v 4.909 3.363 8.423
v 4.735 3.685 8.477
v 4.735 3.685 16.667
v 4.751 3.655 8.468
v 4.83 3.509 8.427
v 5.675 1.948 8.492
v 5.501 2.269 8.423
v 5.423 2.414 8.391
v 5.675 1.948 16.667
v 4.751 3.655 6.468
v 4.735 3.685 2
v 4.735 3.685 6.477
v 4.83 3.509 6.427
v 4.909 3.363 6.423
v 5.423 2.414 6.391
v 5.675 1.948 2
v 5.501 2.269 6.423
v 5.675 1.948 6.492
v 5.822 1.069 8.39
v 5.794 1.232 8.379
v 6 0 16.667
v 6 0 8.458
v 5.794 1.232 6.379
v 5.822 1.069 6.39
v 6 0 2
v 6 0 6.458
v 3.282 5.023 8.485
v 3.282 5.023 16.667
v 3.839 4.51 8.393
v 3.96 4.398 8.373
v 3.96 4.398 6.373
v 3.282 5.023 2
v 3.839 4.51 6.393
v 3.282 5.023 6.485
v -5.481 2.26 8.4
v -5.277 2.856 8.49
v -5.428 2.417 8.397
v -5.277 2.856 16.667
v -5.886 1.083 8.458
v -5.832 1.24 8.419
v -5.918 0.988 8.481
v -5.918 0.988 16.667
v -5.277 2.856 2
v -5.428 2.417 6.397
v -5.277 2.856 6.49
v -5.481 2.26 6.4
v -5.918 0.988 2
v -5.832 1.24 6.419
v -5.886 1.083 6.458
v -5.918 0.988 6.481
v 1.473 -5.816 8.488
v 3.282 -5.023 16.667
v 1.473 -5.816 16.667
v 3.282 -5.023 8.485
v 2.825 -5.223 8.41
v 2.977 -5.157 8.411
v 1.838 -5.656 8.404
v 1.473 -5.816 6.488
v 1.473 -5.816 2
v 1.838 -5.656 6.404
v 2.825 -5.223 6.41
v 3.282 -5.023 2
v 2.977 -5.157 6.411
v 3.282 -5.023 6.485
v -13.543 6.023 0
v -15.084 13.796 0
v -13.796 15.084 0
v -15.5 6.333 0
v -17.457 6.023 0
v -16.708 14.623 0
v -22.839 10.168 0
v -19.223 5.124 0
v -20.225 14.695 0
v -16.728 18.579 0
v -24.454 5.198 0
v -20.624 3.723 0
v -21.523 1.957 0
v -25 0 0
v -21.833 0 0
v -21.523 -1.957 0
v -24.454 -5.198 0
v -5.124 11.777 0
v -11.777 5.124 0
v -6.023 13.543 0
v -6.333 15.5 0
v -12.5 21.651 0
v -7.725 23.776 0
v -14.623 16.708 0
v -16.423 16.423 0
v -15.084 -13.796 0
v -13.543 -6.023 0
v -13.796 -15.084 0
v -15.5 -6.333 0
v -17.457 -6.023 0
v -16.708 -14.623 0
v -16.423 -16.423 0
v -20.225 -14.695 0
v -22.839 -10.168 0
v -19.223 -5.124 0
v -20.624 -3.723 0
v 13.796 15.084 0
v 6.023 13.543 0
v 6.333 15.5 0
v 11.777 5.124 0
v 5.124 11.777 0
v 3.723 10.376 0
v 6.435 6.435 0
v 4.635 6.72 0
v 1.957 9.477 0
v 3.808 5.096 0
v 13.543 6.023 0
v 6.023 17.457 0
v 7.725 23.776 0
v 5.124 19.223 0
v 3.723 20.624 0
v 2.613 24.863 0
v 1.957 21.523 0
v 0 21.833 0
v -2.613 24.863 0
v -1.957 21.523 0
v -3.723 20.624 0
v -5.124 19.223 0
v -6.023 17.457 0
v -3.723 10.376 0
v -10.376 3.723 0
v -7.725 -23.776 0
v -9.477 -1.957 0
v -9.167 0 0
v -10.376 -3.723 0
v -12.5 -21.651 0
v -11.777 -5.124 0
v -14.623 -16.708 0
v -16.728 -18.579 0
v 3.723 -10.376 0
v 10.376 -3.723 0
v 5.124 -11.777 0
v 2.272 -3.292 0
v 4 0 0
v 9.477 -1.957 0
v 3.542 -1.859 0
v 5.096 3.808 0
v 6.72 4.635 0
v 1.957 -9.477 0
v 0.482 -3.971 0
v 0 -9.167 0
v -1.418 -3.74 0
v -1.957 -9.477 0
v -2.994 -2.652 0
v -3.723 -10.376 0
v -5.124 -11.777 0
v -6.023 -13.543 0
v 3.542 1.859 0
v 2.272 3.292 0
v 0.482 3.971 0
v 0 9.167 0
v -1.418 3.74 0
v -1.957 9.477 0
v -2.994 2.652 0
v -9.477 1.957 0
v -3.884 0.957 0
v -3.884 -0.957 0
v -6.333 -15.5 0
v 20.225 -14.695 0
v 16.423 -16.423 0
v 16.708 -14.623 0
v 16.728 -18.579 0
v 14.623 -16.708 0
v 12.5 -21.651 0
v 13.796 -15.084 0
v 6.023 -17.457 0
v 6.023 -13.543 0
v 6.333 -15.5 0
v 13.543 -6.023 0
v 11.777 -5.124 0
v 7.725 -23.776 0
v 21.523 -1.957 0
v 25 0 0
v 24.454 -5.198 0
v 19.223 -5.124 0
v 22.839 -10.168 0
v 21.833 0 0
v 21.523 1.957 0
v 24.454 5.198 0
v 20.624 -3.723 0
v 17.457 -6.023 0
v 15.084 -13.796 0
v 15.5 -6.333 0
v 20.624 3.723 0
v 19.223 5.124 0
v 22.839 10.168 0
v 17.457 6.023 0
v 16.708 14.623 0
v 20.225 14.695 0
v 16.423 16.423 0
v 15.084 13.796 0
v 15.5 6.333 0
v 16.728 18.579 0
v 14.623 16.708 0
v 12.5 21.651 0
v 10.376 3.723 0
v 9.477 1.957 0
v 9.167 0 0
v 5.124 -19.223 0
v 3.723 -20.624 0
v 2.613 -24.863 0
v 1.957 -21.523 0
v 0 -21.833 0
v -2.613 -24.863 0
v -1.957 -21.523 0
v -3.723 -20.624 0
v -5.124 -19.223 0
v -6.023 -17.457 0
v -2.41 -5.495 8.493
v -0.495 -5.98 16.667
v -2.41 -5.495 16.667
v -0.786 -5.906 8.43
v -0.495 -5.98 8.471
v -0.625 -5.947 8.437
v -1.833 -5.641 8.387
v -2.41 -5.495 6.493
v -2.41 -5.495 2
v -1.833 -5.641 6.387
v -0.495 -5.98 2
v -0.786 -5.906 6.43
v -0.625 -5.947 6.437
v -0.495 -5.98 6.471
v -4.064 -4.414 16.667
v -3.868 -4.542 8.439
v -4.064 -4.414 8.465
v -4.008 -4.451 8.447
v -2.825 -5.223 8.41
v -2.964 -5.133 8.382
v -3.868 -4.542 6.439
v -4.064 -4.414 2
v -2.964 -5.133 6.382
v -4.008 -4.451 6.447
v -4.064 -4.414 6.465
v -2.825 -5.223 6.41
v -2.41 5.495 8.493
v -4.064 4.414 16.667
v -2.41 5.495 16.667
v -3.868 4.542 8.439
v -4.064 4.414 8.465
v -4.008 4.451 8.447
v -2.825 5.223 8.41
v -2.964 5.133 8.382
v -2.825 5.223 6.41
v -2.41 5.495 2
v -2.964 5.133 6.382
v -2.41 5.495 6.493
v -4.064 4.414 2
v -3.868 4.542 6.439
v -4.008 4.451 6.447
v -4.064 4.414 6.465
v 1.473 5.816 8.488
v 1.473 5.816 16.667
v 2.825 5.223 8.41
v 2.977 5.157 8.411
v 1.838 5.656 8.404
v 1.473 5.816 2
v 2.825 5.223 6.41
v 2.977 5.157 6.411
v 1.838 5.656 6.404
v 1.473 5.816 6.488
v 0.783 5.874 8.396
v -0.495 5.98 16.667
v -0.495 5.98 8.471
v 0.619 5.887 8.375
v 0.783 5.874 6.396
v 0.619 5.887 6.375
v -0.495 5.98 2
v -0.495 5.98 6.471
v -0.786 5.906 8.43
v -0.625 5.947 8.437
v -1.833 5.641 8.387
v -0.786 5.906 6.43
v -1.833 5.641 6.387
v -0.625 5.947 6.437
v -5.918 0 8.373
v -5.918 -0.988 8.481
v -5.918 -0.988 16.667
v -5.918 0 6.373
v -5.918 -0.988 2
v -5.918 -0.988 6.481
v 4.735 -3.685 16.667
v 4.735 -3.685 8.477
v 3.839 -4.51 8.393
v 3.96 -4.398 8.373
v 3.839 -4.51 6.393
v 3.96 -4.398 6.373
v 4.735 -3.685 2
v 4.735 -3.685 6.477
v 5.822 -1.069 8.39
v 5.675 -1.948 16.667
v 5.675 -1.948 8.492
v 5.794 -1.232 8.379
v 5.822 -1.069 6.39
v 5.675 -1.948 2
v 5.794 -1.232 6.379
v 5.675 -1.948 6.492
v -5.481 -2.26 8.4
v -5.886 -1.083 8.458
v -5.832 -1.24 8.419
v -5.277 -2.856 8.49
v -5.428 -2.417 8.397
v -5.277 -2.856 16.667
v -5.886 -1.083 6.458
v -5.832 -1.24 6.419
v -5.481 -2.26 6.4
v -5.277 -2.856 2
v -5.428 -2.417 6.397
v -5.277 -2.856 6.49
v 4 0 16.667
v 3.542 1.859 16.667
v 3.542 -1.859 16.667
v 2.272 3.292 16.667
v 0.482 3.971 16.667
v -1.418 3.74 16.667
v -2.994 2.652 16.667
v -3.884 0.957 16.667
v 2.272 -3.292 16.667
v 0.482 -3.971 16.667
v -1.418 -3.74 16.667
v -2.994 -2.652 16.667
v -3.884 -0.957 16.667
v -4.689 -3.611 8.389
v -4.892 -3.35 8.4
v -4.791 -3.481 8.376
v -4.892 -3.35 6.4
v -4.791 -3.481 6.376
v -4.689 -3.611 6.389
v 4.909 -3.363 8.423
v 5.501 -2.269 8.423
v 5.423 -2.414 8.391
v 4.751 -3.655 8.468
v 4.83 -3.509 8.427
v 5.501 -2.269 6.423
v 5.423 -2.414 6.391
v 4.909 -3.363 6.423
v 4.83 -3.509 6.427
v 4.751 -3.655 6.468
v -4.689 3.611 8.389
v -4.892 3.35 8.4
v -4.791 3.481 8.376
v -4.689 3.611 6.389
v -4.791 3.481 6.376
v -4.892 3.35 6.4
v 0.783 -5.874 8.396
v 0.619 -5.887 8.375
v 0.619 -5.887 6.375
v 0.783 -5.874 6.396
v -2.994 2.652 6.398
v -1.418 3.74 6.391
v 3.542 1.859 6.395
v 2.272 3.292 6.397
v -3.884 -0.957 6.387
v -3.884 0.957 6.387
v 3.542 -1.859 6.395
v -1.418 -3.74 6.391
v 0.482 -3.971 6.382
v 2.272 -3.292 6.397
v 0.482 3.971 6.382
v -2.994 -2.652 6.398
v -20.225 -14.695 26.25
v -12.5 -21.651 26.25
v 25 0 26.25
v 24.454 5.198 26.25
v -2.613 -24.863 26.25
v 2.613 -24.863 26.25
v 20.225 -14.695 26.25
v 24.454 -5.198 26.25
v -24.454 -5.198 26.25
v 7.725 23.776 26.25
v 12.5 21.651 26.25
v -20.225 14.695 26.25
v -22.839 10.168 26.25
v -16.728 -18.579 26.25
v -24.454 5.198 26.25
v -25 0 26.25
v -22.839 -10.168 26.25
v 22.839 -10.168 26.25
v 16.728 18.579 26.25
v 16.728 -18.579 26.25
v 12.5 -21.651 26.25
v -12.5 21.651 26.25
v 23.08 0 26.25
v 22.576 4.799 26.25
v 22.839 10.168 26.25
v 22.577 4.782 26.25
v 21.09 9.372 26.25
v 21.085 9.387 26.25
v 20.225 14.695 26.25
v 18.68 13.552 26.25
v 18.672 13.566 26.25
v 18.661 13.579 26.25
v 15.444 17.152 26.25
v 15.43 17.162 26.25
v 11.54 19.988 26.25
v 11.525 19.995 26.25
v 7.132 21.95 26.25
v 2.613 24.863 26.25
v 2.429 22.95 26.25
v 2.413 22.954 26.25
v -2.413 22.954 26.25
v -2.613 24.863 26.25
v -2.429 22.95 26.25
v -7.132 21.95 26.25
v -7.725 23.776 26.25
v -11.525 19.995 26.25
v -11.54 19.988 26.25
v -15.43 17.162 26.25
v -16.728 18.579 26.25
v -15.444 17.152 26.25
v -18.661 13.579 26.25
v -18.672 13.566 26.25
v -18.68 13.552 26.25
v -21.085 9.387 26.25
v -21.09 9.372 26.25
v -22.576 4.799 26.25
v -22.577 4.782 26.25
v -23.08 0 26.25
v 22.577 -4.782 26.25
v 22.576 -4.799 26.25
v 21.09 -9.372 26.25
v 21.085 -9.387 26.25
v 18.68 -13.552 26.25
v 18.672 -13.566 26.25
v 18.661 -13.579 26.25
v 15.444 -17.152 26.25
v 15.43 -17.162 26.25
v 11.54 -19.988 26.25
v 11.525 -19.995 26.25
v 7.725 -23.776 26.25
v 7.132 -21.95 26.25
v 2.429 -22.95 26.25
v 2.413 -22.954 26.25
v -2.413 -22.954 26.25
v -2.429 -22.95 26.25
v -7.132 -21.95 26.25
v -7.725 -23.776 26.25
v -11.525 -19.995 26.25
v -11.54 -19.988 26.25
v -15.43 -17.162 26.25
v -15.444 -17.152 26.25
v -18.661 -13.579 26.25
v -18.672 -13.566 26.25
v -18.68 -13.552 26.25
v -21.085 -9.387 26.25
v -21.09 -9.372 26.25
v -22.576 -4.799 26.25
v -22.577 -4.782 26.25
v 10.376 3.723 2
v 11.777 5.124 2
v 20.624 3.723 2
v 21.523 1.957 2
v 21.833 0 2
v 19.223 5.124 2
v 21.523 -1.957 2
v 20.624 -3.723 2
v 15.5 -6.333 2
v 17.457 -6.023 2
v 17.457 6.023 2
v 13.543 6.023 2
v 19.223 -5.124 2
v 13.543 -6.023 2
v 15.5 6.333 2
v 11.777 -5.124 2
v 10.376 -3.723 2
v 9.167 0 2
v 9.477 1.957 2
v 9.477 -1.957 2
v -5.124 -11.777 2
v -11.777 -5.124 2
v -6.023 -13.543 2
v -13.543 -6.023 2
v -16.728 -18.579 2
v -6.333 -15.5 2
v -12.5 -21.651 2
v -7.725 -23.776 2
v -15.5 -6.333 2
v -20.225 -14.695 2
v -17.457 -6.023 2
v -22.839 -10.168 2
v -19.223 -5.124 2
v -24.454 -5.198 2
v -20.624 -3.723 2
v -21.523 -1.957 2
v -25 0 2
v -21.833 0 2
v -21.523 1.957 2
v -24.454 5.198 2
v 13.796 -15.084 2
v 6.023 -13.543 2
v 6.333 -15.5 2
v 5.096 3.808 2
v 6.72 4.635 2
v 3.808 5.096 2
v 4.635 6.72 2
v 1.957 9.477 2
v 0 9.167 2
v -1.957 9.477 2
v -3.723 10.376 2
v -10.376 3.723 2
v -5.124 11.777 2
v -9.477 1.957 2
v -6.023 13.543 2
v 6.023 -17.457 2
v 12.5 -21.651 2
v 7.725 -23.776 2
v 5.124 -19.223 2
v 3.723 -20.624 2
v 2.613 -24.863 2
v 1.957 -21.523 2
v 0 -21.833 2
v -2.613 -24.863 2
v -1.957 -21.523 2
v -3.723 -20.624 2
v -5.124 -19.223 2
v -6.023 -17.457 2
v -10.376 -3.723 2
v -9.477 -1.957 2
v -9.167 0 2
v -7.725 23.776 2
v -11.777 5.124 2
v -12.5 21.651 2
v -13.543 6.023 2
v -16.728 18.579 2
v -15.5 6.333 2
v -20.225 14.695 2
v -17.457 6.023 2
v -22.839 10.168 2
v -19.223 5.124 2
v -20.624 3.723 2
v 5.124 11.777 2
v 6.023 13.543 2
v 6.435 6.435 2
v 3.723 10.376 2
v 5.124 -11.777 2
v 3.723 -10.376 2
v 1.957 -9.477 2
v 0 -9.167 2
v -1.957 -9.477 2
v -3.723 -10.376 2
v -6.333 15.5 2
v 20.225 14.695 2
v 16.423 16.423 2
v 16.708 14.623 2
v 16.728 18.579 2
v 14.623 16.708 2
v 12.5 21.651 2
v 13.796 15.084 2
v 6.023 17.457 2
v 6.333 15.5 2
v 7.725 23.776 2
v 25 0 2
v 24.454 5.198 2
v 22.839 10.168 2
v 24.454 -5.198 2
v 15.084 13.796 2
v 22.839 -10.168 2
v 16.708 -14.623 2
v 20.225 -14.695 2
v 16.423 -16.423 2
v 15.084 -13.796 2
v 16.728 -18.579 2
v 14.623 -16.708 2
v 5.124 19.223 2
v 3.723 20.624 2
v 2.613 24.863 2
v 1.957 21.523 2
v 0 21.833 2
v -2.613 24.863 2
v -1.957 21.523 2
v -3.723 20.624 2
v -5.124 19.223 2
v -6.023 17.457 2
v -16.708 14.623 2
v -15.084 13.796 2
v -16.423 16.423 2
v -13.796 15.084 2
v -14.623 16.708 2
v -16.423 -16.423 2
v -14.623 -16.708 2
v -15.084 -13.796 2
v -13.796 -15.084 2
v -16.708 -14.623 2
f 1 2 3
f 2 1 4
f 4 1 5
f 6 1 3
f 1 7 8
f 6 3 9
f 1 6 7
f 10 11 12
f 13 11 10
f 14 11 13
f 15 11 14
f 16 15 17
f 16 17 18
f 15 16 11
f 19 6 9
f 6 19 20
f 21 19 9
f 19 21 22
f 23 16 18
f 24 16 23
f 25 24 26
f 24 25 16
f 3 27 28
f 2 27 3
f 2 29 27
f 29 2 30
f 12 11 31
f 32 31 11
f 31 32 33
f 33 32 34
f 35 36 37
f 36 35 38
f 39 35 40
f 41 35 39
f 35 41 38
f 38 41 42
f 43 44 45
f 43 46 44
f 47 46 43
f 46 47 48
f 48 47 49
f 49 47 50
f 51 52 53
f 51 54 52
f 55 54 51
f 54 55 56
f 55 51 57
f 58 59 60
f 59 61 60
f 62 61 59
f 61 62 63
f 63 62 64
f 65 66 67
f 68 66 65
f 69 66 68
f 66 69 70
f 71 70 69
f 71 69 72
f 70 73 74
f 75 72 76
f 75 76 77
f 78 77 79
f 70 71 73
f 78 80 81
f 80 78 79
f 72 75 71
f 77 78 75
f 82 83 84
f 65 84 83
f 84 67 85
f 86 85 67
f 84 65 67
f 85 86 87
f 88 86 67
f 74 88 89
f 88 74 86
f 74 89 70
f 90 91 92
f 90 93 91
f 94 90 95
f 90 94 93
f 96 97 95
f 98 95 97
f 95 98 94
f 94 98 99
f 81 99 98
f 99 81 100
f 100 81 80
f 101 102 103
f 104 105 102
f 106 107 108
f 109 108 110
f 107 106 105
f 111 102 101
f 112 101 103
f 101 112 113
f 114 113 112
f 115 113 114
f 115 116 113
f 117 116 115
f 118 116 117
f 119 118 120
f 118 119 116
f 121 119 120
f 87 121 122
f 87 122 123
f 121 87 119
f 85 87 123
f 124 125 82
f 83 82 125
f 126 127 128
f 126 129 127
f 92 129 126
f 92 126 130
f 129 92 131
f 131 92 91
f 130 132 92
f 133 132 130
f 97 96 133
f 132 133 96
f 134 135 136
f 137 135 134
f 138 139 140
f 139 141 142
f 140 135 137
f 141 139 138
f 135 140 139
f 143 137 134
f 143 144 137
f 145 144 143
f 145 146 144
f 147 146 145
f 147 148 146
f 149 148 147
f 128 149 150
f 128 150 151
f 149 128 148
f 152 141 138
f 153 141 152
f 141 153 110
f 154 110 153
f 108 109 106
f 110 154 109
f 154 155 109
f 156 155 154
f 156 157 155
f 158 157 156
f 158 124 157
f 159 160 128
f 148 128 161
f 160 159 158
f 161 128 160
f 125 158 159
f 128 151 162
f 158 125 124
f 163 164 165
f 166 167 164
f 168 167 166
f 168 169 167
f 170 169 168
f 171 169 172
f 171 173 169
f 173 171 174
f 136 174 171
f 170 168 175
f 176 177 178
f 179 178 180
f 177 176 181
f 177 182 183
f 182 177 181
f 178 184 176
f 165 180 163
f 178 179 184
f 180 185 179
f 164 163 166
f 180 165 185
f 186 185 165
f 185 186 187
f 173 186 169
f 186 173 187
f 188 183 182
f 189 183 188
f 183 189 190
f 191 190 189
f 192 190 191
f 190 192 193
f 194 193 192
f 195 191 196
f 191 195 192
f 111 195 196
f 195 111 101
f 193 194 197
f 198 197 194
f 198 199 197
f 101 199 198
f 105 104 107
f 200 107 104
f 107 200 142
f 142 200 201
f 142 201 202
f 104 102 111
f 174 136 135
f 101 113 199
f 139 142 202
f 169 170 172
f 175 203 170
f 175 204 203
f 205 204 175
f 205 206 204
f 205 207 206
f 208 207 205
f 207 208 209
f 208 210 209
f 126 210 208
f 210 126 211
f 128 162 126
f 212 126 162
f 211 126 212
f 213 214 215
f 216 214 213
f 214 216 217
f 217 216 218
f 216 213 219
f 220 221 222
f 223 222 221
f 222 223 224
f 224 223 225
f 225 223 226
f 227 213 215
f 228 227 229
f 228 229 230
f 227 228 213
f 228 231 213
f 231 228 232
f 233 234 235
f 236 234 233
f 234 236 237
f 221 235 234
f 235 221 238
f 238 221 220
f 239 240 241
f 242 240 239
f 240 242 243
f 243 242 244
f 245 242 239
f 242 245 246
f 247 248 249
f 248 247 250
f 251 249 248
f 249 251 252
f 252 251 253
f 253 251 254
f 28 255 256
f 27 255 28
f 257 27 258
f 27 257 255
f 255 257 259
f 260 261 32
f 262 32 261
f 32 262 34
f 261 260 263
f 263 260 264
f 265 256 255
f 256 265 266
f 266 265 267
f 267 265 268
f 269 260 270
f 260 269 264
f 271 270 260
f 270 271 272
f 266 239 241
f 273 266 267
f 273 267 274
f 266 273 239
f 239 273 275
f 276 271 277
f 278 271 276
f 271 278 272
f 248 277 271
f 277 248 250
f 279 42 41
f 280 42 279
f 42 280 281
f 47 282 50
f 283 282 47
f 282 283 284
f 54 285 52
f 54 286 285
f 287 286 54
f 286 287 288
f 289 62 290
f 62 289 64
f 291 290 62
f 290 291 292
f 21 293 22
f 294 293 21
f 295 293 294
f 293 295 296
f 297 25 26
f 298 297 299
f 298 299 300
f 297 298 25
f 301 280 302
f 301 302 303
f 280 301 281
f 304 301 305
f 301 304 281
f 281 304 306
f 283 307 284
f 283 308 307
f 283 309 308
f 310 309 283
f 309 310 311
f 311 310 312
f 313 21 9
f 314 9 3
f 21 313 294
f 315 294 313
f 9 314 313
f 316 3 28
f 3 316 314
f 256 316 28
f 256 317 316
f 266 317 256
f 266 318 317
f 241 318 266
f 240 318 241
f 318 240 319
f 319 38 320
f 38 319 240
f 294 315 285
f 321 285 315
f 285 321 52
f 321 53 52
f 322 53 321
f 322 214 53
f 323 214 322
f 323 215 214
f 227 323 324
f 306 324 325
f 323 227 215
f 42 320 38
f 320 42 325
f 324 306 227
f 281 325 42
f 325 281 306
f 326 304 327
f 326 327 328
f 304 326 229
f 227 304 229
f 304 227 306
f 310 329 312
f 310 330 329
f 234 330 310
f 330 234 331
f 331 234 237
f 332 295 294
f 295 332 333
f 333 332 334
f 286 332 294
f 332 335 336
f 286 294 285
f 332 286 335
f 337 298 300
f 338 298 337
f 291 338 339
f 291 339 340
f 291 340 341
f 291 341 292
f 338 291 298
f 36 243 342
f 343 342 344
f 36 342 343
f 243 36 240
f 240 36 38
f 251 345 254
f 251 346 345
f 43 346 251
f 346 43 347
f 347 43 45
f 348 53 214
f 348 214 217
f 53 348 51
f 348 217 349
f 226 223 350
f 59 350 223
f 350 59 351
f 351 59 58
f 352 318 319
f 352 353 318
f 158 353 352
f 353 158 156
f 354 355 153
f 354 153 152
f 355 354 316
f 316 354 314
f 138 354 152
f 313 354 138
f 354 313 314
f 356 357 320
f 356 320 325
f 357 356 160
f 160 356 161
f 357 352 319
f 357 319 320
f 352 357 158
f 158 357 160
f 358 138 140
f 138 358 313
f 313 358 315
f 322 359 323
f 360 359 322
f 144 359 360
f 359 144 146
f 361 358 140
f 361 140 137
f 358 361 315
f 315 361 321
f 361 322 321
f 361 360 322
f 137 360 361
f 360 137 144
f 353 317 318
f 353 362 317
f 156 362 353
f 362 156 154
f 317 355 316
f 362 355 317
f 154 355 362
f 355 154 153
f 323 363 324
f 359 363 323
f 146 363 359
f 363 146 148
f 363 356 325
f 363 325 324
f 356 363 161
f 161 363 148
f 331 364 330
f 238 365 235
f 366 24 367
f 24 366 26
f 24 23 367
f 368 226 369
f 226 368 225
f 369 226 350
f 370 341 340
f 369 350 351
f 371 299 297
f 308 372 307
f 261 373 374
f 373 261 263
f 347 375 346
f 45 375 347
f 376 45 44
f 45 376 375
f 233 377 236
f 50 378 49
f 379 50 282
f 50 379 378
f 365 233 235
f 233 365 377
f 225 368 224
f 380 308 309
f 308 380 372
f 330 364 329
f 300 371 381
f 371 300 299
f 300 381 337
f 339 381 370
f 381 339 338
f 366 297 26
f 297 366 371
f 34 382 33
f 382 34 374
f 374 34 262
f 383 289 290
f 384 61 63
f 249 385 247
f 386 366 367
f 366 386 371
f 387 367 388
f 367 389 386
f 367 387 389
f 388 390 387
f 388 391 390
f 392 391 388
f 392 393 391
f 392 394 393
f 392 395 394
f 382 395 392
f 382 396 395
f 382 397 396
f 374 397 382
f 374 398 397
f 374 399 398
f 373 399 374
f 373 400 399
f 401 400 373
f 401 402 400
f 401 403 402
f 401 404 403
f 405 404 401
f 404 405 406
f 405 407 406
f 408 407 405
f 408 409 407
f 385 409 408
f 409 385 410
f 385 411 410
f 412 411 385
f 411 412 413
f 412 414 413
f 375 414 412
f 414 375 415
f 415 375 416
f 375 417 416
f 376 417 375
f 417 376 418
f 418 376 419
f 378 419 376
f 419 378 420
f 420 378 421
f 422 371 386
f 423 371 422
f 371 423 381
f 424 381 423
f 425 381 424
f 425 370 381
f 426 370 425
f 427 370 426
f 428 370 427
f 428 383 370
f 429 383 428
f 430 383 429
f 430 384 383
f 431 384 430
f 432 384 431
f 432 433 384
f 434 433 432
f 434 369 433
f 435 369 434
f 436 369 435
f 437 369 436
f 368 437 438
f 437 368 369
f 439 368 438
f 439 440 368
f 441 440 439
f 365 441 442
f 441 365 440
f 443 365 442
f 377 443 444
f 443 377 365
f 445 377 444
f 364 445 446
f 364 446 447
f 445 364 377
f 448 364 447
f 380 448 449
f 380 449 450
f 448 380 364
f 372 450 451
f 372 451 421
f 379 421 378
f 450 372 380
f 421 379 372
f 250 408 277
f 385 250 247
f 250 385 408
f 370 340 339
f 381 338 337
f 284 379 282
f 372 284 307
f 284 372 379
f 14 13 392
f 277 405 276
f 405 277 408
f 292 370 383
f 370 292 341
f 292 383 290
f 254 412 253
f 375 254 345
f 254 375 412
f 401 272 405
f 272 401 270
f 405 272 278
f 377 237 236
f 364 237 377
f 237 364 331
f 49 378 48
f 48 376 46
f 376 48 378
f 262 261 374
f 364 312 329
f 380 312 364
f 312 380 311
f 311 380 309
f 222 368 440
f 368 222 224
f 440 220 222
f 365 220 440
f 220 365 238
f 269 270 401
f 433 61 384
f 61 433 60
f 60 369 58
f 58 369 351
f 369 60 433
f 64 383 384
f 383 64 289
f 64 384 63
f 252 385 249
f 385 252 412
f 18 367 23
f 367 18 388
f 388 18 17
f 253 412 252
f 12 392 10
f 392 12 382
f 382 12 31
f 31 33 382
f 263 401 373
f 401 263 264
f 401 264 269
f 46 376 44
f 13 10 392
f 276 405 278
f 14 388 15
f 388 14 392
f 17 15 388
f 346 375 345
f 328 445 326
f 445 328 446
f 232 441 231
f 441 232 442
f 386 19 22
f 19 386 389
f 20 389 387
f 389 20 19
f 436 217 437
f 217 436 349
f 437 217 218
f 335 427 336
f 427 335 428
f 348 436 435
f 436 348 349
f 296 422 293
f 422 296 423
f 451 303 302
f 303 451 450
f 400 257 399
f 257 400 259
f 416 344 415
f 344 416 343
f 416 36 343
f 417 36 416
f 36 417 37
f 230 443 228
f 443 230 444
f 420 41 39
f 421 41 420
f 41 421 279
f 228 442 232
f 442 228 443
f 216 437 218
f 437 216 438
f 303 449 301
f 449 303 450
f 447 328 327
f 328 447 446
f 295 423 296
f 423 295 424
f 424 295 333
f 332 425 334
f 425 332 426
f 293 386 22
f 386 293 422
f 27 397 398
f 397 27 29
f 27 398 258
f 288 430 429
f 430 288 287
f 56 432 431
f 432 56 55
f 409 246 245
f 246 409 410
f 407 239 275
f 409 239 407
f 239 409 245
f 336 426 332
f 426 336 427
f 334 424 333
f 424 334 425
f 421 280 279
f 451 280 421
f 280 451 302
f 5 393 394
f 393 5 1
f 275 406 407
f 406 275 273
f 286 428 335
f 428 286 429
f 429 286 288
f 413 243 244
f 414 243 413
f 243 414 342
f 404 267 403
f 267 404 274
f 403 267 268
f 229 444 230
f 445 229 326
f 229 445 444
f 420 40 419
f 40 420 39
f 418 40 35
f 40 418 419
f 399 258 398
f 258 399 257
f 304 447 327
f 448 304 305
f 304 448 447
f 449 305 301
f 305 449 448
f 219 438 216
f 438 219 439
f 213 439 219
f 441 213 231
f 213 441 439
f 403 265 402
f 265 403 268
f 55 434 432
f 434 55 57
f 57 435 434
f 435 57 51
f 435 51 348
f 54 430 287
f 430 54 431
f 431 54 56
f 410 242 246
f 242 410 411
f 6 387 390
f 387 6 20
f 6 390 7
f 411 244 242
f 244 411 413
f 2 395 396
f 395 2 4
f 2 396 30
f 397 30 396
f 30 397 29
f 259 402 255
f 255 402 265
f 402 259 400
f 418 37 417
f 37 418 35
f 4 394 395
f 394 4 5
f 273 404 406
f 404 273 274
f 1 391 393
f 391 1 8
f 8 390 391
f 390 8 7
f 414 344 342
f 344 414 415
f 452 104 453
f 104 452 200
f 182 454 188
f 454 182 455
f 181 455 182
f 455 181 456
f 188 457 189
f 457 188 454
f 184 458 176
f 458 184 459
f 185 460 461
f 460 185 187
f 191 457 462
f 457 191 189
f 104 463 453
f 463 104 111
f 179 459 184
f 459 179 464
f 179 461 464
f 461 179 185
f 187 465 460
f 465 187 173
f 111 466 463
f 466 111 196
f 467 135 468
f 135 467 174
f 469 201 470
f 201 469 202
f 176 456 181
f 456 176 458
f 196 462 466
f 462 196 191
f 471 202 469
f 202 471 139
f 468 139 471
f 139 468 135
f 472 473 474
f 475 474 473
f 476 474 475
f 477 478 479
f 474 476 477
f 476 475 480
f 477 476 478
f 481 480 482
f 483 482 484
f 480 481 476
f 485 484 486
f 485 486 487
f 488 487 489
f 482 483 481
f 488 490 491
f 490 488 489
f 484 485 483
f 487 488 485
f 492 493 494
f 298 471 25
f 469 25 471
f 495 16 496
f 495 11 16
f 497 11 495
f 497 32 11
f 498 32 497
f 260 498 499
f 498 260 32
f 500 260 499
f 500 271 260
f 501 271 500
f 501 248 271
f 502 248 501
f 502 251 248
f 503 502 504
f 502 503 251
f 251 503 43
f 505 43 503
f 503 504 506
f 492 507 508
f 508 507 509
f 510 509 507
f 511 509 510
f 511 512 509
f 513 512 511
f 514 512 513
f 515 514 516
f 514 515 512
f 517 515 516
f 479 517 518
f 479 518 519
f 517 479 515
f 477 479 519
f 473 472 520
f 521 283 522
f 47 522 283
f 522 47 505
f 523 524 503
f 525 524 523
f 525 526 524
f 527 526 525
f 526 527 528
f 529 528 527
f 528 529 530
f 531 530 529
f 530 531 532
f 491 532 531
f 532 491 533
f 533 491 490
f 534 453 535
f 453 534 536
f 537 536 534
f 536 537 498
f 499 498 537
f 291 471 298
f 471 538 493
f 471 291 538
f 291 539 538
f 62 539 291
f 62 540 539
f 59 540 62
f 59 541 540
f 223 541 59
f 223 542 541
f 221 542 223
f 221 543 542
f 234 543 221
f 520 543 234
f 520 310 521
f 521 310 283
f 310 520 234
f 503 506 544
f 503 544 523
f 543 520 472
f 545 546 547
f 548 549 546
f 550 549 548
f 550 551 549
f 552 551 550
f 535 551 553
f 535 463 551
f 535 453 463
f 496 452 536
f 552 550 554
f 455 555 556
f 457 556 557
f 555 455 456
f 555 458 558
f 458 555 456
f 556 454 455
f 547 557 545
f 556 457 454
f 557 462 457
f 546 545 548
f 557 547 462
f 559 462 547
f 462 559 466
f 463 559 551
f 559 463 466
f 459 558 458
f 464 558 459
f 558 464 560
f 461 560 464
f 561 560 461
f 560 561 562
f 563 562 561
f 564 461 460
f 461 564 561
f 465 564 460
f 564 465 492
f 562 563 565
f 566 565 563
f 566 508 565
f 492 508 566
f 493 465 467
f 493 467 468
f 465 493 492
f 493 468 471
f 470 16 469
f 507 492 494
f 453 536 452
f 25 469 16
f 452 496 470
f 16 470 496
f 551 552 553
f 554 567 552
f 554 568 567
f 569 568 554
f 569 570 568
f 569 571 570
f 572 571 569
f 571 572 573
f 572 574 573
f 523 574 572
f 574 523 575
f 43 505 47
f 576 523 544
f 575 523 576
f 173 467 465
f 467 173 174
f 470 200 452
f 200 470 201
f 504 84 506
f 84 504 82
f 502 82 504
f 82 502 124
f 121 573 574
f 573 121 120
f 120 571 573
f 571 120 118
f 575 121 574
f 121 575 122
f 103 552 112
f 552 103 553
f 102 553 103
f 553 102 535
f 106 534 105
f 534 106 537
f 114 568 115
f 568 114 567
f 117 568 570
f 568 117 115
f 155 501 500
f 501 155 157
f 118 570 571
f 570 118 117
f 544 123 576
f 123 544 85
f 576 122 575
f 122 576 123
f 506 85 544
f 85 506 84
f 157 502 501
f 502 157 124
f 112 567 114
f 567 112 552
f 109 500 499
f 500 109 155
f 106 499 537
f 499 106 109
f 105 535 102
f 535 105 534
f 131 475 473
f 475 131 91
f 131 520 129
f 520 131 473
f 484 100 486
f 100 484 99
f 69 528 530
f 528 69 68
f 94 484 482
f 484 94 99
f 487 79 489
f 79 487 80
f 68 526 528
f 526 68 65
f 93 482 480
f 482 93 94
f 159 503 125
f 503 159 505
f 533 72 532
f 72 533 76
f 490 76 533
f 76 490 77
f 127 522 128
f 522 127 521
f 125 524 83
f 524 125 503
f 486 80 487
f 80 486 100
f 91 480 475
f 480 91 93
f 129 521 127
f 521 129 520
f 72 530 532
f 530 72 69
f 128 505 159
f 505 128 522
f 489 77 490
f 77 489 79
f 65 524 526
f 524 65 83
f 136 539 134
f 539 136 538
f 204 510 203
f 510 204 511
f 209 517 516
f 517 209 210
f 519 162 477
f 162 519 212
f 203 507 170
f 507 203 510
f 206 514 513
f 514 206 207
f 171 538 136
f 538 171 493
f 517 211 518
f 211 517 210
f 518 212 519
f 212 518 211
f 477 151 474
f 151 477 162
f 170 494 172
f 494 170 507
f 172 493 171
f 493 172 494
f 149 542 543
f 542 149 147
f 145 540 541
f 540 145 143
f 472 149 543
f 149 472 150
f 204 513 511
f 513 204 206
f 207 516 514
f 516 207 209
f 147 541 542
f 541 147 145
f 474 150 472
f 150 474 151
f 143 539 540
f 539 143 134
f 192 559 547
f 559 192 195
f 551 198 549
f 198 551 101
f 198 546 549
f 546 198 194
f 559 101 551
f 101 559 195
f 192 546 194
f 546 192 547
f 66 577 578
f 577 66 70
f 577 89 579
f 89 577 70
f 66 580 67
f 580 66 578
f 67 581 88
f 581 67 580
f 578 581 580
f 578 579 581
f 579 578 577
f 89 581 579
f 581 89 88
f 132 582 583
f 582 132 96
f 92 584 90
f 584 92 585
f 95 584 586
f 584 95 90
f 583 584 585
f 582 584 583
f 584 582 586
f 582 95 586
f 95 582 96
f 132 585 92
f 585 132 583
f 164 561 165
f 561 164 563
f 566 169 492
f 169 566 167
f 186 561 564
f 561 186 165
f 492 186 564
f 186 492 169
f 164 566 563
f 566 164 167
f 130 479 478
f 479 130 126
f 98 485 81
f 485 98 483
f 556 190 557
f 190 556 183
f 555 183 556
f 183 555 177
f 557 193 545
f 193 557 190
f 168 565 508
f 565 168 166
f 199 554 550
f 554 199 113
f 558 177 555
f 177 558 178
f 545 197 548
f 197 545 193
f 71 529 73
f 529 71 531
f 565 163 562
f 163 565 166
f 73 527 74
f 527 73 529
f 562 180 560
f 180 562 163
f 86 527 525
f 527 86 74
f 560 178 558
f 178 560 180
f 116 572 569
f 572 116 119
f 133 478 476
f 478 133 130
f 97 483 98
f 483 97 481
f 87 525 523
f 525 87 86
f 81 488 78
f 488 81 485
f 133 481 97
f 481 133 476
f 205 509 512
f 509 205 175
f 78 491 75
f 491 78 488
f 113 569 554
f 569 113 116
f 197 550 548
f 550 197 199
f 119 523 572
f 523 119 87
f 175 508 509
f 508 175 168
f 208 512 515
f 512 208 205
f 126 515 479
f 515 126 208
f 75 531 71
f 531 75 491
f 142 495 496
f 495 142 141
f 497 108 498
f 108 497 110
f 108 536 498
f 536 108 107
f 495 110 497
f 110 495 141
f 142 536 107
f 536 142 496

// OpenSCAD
//  Mini Filament spool for small filament samples

// Number of fragments in render = slow but pretty
//$fn=150; 

// Variables
// Spool outer radius
SpoolRadius = 25;
// Height of inner hub
HubHeight = SpoolRadius / 1.5;
// Radius of hole through spool
HubInnerRadius = 4;
// Thickness of inner hub wall
HubWallThickness = 2;
// Radius of outer edge of hub
HubOuterRadius = HubInnerRadius + HubWallThickness;
// Thickness of cone wall
ConeWallThickness = 2;
// Offset of cone from origin (Z axis)
OuterConeOffset = SpoolRadius / 20;
// Offset of inner cone (inner cone is subtracted from outer cone)
InnerConeOffset = OuterConeOffset + ConeWallThickness;
// Offset of large holes
LargeHoleOffset = HubOuterRadius + (SpoolRadius - HubOuterRadius) / 2;
// Radius of large holes
LargeHoleRadius = (SpoolRadius - HubOuterRadius)/3;
// Percentage of spool radius at which to place the anchor holes
FilamentAnchorHoleOffsetPercent = .825;
// Offset of filament anchor holes
FilamentAnchorHoleOffset = HubOuterRadius + (SpoolRadius - HubOuterRadius) * FilamentAnchorHoleOffsetPercent;
// Filament anchor hole radius
FilamentAnchorHoleRadius = 1.55;
// Thickness of  bottom flat plate
BottomPlateHeight = 2;

// Central hub
difference(){
    cylinder(h=HubHeight, r=HubOuterRadius);
    cylinder(h=HubHeight, r=HubInnerRadius);
};

// Top cone
difference() {
    // Outer cone
    translate(v=[0,0,OuterConeOffset]) { 
        cylinder(h=SpoolRadius, r1=1, r2=SpoolRadius); 
    };
    // Inner cone
    translate(v=[0,0,InnerConeOffset]) { 
        cylinder(h=SpoolRadius, r1=1, r2=SpoolRadius); 
    };
    // Hub hole throught cone
    cylinder(h=SpoolRadius, r=HubInnerRadius);
}
    
// Bottom plate
difference(){
    // Bottom plate
    cylinder(h=2,r=SpoolRadius);
    // Large holes
    for(i=[0:3]) {
        rotate(i * 90) {
            translate([LargeHoleOffset,0,0]) {
                cylinder(h=BottomPlateHeight,r=LargeHoleRadius);
            };
        };
    };
    // Filament anchor holes
    for(i=[0:3]) {
        rotate(i * 90 + 45) {
            translate([FilamentAnchorHoleOffset,0,0]) {
                cylinder(h=BottomPlateHeight,r=FilamentAnchorHoleRadius);
            };
        };
    };
    // Inner filament anchor hole
    rotate(45) {
        translate(v=[HubOuterRadius + FilamentAnchorHoleRadius,0,0]) {
            cylinder(h=BottomPlateHeight,r=FilamentAnchorHoleRadius);
        };
    };
    // Hub hole throught bottom plate
    cylinder(h=SpoolRadius, r=HubInnerRadius);   
};
